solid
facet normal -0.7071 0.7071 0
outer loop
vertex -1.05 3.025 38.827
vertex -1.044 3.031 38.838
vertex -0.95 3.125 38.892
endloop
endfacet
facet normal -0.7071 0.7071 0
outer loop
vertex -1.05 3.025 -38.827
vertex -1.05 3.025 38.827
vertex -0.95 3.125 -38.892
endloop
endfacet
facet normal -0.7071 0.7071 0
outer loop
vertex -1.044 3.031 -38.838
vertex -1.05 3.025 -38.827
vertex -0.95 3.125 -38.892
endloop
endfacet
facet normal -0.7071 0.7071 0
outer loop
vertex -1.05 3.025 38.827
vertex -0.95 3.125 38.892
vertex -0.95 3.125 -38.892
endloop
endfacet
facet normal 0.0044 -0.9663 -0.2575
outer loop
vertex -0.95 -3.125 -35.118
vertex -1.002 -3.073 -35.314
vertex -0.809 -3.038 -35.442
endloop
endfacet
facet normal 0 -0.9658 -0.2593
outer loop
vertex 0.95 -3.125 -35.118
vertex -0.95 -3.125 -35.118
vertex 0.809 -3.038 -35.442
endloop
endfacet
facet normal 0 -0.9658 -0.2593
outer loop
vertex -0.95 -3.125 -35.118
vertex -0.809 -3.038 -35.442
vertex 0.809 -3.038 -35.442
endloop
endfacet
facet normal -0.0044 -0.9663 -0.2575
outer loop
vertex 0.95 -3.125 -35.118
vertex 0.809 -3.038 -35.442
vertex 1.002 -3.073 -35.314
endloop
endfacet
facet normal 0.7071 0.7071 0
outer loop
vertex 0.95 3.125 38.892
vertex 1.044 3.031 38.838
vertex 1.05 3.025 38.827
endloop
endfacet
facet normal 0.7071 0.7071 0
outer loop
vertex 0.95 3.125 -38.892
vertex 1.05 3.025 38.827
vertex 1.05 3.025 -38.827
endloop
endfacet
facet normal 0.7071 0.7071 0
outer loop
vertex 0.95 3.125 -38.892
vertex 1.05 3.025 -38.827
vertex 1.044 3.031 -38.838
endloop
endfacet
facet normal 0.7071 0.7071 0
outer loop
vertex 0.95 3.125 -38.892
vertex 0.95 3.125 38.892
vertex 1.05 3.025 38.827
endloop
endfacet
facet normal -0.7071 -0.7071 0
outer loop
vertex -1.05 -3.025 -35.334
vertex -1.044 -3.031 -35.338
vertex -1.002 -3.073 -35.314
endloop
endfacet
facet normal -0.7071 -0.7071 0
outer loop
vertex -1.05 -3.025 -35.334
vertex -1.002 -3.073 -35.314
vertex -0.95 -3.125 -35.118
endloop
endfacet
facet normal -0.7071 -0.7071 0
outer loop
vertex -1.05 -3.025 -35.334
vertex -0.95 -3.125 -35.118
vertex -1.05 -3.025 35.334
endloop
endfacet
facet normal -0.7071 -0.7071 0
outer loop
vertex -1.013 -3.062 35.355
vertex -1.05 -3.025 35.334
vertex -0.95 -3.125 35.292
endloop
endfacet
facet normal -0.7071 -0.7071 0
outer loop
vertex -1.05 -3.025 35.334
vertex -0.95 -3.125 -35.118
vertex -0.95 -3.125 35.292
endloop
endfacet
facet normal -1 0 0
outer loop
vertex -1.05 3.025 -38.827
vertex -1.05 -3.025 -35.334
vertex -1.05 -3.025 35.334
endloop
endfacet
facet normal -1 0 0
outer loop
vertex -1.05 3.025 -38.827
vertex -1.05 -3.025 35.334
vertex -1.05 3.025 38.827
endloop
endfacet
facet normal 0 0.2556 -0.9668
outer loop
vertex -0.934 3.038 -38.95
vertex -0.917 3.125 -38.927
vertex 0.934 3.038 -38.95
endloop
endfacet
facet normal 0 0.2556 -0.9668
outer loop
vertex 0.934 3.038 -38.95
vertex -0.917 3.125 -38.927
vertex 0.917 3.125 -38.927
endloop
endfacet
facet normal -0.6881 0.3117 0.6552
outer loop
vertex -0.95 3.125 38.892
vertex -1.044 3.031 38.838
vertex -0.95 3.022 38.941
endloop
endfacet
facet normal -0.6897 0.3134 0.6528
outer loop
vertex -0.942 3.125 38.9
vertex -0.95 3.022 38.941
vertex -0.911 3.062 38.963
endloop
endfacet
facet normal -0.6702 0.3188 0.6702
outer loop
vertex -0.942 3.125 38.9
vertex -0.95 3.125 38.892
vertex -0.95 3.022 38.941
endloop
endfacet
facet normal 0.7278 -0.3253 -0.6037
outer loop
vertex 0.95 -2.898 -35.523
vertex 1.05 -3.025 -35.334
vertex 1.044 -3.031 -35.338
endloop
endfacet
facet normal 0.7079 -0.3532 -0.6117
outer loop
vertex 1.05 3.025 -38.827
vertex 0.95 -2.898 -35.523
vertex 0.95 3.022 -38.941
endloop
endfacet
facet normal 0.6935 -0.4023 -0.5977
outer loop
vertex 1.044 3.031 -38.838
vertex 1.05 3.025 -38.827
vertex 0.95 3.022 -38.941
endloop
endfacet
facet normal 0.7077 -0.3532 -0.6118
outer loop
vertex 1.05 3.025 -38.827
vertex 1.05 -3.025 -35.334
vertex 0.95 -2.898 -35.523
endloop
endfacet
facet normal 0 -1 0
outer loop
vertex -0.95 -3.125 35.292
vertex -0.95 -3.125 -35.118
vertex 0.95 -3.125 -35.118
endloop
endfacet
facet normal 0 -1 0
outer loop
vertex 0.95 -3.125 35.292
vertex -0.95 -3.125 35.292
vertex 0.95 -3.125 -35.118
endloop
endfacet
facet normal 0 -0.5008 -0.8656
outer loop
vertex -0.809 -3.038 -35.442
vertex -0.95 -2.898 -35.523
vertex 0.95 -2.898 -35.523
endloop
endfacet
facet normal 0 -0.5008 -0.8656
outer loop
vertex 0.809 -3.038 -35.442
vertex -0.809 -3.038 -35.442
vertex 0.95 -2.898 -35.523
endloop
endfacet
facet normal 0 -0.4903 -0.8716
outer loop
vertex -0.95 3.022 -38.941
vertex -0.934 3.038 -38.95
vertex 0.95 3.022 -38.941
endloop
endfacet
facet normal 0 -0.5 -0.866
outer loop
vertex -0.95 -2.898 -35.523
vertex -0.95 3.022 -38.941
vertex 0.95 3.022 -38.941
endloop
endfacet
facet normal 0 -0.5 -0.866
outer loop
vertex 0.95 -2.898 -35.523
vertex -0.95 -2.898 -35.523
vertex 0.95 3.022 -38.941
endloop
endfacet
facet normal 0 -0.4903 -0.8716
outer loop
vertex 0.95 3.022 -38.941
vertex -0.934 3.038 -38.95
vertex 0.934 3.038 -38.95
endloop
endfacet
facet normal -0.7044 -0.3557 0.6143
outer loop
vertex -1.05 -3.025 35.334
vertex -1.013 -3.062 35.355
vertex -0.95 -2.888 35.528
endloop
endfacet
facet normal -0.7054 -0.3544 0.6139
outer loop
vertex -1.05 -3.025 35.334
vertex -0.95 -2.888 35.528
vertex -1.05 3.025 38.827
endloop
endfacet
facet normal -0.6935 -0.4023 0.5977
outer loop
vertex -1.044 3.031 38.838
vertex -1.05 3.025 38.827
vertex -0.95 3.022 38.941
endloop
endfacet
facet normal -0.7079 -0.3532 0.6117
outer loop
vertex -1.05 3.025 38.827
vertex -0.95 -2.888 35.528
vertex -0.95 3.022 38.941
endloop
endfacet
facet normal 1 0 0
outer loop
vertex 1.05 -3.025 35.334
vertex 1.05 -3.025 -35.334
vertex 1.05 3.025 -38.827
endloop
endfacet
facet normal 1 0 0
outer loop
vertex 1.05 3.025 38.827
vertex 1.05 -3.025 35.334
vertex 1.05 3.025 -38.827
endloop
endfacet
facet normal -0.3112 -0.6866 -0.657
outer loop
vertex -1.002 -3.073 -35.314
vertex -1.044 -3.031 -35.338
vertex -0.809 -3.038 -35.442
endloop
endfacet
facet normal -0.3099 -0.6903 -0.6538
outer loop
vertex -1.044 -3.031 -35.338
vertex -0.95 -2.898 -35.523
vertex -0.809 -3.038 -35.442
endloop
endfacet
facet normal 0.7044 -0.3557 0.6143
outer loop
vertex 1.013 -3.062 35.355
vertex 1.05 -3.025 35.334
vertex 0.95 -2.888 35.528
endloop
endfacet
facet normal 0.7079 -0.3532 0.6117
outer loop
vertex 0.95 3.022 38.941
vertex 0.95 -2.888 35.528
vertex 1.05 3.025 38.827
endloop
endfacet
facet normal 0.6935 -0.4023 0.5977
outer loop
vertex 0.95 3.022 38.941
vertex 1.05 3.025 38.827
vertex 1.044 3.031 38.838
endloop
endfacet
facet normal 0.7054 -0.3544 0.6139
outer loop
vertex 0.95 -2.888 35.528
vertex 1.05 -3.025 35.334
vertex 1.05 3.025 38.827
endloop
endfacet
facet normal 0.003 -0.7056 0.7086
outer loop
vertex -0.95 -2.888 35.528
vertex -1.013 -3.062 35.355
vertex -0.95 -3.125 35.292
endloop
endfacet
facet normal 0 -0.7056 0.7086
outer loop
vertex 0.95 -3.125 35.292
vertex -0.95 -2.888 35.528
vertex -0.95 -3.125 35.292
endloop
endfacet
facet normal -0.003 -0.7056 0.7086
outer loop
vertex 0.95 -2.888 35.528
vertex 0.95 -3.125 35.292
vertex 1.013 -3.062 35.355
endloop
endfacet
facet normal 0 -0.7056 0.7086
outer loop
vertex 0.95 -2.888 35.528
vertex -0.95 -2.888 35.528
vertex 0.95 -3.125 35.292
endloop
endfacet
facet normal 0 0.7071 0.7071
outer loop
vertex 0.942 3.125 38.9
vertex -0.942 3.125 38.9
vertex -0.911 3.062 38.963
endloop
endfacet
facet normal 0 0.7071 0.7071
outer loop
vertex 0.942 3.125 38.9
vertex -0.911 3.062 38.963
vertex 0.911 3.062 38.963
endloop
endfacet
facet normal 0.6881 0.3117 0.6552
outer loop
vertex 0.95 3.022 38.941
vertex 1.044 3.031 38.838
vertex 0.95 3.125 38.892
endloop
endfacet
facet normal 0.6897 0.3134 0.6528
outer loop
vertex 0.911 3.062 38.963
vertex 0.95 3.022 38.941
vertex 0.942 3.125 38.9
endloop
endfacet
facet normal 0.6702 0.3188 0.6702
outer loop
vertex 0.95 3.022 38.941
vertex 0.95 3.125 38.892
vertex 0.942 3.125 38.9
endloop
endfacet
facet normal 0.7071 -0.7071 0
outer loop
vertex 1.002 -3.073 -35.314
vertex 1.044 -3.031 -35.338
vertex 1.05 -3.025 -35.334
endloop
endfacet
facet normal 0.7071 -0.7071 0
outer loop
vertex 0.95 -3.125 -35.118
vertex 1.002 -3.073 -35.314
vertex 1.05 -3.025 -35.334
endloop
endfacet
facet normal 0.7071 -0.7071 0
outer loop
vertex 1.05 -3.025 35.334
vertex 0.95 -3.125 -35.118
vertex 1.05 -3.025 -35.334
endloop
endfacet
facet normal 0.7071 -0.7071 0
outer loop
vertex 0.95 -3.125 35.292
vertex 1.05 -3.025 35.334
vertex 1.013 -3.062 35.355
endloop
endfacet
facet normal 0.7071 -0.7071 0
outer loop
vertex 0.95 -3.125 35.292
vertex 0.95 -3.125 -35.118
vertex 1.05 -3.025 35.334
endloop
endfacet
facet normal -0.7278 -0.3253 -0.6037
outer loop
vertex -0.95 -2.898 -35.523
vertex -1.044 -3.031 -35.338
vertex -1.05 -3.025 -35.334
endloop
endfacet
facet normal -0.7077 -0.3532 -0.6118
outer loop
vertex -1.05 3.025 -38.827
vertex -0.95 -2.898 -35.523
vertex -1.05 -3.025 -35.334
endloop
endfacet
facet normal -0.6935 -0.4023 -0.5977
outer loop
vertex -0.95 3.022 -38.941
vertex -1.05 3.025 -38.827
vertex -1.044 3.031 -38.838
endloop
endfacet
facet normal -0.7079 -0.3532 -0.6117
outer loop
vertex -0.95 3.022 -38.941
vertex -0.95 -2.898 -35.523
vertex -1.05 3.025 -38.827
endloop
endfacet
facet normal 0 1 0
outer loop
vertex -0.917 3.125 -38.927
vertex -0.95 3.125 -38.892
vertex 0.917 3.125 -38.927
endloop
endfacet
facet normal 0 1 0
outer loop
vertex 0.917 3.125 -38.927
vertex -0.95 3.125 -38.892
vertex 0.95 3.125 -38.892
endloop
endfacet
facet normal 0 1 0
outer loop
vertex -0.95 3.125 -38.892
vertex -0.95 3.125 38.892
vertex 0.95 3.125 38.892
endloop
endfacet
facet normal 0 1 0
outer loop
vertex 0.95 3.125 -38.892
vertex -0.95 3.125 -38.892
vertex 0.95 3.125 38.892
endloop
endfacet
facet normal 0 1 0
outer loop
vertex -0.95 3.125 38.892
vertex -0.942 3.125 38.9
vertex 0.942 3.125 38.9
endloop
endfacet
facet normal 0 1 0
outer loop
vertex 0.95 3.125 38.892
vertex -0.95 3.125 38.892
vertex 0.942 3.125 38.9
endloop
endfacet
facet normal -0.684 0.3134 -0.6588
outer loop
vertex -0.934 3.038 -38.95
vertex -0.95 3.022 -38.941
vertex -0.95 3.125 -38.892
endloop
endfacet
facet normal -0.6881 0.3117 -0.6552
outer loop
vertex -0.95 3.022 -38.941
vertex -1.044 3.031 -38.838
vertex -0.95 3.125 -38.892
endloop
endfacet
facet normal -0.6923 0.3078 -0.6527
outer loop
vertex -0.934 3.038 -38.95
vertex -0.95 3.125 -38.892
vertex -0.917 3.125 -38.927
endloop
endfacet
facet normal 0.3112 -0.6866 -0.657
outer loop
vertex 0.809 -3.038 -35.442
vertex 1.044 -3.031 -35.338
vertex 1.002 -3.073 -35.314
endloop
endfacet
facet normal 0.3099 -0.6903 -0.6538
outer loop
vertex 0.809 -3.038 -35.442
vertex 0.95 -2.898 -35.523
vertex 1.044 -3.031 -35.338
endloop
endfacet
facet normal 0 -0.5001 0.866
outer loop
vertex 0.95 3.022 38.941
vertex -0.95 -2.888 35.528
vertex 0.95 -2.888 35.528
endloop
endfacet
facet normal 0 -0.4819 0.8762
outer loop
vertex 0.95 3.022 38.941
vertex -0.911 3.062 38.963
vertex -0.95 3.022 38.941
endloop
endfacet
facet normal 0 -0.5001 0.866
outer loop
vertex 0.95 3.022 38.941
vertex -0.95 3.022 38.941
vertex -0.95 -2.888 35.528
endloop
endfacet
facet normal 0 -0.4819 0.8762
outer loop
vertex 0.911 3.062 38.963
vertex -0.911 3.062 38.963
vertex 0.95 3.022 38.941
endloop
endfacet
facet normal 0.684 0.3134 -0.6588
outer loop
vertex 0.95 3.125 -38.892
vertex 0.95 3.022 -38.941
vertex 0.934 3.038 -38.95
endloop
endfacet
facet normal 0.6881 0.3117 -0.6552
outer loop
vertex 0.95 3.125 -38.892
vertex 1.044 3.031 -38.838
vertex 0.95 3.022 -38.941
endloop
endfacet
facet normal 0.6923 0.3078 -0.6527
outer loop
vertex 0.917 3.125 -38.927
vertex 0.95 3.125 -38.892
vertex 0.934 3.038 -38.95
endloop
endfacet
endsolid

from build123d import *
from OCP.BRepFilletAPI import BRepFilletAPI_MakeChamfer

# Parameters (mm, degrees)
SKETCH1_W           = 2.1
SKETCH1_H           = 6.25
BOSS_EXTRUDE1_DEPTH = 39
DRAFT1_ANGLE        = -30
DRAFT2_ANGLE        = -30
CHAMFER1_SIZE       = 0.1
CHAMFER2_SIZE       = 0.273205081
CHAMFER2_SIZE_2     = 0.1
CHAMFER2_SIZE_3     = 0.073205081
CHAMFER2_SIZE_4     = 0.077581461
CHAMFER2_SIZE_5     = 0.171862365


with BuildPart() as part:
    # Sketch1 → Boss-Extrude1 (new, symmetric)
    with BuildSketch(Plane.XY):
        Rectangle(SKETCH1_W, SKETCH1_H)
    extrude(amount=BOSS_EXTRUDE1_DEPTH, both=True)

    # Draft1
    draft1_faces = [part.faces().sort_by_distance(p)[0] for p in [
        (0, 0, 39),
    ]]
    draft(draft1_faces, Plane(origin=(-1.05, 3.125, 39), x_dir=(0, 0, 1), z_dir=(0, 1, 0)), DRAFT1_ANGLE)

    # Draft2
    draft2_faces = [part.faces().sort_by_distance(p)[0] for p in [
        (0, 0, -39),
    ]]
    draft(draft2_faces, Plane(origin=(-1.05, 3.125, 39), x_dir=(0, 0, 1), z_dir=(0, 1, 0)), DRAFT2_ANGLE)

    # Chamfer1
    chamfer1_edges = [part.edges().sort_by_distance(p)[0] for p in [
        (1.05, -3.125, 0),
        (-1.05, -3.125, 0),
        (-1.05, 3.125, 0),
        (1.05, 3.125, 0),
    ]]
    chamfer(chamfer1_edges, length=CHAMFER1_SIZE)

    # Chamfer2
    chamfer2_edges_1 = [part.edges().sort_by_distance(p)[0] for p in [
        (0, -3.125, -35.391560818),
    ]]
    chamfer2_side_1 = [part.faces().sort_by_distance(p)[0] for p in [
        (0, -3.125, -35.389560818),
    ]]
    chamfer2_edges_2 = [part.edges().sort_by_distance(p)[0] for p in [
        (0, -3.125, 35.391560818),
    ]]
    chamfer2_side_2 = [part.faces().sort_by_distance(p)[0] for p in [
        (0, -3.125, 35.389560818),
    ]]
    chamfer2_edges_3 = [part.edges().sort_by_distance(p)[0] for p in [
        (0, 3.125, -39),
    ]]
    chamfer2_side_3 = [part.faces().sort_by_distance(p)[0] for p in [
        (0, 3.123732051, -38.999267949),
    ]]
    chamfer2_edges_4 = [part.edges().sort_by_distance(p)[0] for p in [
        (1, 3.075, -38.971132487),
    ]]
    chamfer2_side_4 = [part.faces().sort_by_distance(p)[0] for p in [
        (0.998827079, 3.074120309, -38.970624597),
    ]]
    chamfer2_edges_5 = [part.edges().sort_by_distance(p)[0] for p in [
        (1, 3.075, 38.971132487),
    ]]
    chamfer2_side_5 = [part.faces().sort_by_distance(p)[0] for p in [
        (0.998827079, 3.074120309, 38.970624597),
    ]]
    chamfer2_edges_6 = [part.edges().sort_by_distance(p)[0] for p in [
        (-1, 3.075, -38.971132487),
    ]]
    chamfer2_side_6 = [part.faces().sort_by_distance(p)[0] for p in [
        (-0.998827079, 3.074120309, -38.970624597),
    ]]
    chamfer2_edges_7 = [part.edges().sort_by_distance(p)[0] for p in [
        (-1, 3.075, 38.971132487),
    ]]
    chamfer2_side_7 = [part.faces().sort_by_distance(p)[0] for p in [
        (-0.998827079, 3.074120309, 38.970624597),
    ]]
    chamfer2_edges_8 = [part.edges().sort_by_distance(p)[0] for p in [
        (0, 3.125, 39),
    ]]
    chamfer2_side_8 = [part.faces().sort_by_distance(p)[0] for p in [
        (0, 3.123732051, 38.999267949),
    ]]
    chamfer2 = BRepFilletAPI_MakeChamfer(part.part.solid().wrapped)
    for e in chamfer2_edges_1:
        chamfer2.Add(CHAMFER2_SIZE, CHAMFER2_SIZE_2, e.wrapped, chamfer2_side_1[0].wrapped)
    for e in chamfer2_edges_2:
        chamfer2.Add(CHAMFER2_SIZE_2, CHAMFER2_SIZE, e.wrapped, chamfer2_side_2[0].wrapped)
    for e in chamfer2_edges_3:
        chamfer2.Add(CHAMFER2_SIZE_2, CHAMFER2_SIZE_3, e.wrapped, chamfer2_side_3[0].wrapped)
    for e in chamfer2_edges_4:
        chamfer2.Add(CHAMFER2_SIZE_4, CHAMFER2_SIZE_2, e.wrapped, chamfer2_side_4[0].wrapped)
    for e in chamfer2_edges_5:
        chamfer2.Add(CHAMFER2_SIZE_4, CHAMFER2_SIZE_2, e.wrapped, chamfer2_side_5[0].wrapped)
    for e in chamfer2_edges_6:
        chamfer2.Add(CHAMFER2_SIZE_4, CHAMFER2_SIZE_2, e.wrapped, chamfer2_side_6[0].wrapped)
    for e in chamfer2_edges_7:
        chamfer2.Add(CHAMFER2_SIZE_4, CHAMFER2_SIZE_2, e.wrapped, chamfer2_side_7[0].wrapped)
    for e in chamfer2_edges_8:
        chamfer2.Add(CHAMFER2_SIZE_3, CHAMFER2_SIZE_2, e.wrapped, chamfer2_side_8[0].wrapped)
    add(Compound.cast(chamfer2.Shape()), mode=Mode.REPLACE)
    chamfer2_2_edges_1 = [part.edges().sort_by_distance(p)[0] for p in [
        (1.04330127, -3.03169873, -35.445428331),
    ]]
    chamfer2_2_side_1 = [part.faces().sort_by_distance(p)[0] for p in [
        (1.043835793, -3.031164207, -35.443576691),
    ]]
    chamfer2_2_edges_2 = [part.edges().sort_by_distance(p)[0] for p in [
        (-1.04330127, -3.03169873, -35.445428331),
    ]]
    chamfer2_2_side_2 = [part.faces().sort_by_distance(p)[0] for p in [
        (-1.043835793, -3.031164207, -35.443576691),
    ]]
    chamfer2_2 = BRepFilletAPI_MakeChamfer(part.part.solid().wrapped)
    for e in chamfer2_2_edges_1:
        chamfer2_2.Add(CHAMFER2_SIZE_2, CHAMFER2_SIZE_5, e.wrapped, chamfer2_2_side_1[0].wrapped)
    for e in chamfer2_2_edges_2:
        chamfer2_2.Add(CHAMFER2_SIZE_2, CHAMFER2_SIZE_5, e.wrapped, chamfer2_2_side_2[0].wrapped)
    add(Compound.cast(chamfer2_2.Shape()), mode=Mode.REPLACE)
    chamfer2_3_edges = [part.edges().sort_by_distance(p)[0] for p in [
        (1.05, 0.062360956, -37.231784524),
        (-1.05, 0.062360956, -37.231784524),
        (-1.05, 0.016985957, 37.205587256),
        (1.05, 0.016985957, 37.205587256),
    ]]
    chamfer(chamfer2_3_edges, length=CHAMFER2_SIZE_2)


solid = part.part
